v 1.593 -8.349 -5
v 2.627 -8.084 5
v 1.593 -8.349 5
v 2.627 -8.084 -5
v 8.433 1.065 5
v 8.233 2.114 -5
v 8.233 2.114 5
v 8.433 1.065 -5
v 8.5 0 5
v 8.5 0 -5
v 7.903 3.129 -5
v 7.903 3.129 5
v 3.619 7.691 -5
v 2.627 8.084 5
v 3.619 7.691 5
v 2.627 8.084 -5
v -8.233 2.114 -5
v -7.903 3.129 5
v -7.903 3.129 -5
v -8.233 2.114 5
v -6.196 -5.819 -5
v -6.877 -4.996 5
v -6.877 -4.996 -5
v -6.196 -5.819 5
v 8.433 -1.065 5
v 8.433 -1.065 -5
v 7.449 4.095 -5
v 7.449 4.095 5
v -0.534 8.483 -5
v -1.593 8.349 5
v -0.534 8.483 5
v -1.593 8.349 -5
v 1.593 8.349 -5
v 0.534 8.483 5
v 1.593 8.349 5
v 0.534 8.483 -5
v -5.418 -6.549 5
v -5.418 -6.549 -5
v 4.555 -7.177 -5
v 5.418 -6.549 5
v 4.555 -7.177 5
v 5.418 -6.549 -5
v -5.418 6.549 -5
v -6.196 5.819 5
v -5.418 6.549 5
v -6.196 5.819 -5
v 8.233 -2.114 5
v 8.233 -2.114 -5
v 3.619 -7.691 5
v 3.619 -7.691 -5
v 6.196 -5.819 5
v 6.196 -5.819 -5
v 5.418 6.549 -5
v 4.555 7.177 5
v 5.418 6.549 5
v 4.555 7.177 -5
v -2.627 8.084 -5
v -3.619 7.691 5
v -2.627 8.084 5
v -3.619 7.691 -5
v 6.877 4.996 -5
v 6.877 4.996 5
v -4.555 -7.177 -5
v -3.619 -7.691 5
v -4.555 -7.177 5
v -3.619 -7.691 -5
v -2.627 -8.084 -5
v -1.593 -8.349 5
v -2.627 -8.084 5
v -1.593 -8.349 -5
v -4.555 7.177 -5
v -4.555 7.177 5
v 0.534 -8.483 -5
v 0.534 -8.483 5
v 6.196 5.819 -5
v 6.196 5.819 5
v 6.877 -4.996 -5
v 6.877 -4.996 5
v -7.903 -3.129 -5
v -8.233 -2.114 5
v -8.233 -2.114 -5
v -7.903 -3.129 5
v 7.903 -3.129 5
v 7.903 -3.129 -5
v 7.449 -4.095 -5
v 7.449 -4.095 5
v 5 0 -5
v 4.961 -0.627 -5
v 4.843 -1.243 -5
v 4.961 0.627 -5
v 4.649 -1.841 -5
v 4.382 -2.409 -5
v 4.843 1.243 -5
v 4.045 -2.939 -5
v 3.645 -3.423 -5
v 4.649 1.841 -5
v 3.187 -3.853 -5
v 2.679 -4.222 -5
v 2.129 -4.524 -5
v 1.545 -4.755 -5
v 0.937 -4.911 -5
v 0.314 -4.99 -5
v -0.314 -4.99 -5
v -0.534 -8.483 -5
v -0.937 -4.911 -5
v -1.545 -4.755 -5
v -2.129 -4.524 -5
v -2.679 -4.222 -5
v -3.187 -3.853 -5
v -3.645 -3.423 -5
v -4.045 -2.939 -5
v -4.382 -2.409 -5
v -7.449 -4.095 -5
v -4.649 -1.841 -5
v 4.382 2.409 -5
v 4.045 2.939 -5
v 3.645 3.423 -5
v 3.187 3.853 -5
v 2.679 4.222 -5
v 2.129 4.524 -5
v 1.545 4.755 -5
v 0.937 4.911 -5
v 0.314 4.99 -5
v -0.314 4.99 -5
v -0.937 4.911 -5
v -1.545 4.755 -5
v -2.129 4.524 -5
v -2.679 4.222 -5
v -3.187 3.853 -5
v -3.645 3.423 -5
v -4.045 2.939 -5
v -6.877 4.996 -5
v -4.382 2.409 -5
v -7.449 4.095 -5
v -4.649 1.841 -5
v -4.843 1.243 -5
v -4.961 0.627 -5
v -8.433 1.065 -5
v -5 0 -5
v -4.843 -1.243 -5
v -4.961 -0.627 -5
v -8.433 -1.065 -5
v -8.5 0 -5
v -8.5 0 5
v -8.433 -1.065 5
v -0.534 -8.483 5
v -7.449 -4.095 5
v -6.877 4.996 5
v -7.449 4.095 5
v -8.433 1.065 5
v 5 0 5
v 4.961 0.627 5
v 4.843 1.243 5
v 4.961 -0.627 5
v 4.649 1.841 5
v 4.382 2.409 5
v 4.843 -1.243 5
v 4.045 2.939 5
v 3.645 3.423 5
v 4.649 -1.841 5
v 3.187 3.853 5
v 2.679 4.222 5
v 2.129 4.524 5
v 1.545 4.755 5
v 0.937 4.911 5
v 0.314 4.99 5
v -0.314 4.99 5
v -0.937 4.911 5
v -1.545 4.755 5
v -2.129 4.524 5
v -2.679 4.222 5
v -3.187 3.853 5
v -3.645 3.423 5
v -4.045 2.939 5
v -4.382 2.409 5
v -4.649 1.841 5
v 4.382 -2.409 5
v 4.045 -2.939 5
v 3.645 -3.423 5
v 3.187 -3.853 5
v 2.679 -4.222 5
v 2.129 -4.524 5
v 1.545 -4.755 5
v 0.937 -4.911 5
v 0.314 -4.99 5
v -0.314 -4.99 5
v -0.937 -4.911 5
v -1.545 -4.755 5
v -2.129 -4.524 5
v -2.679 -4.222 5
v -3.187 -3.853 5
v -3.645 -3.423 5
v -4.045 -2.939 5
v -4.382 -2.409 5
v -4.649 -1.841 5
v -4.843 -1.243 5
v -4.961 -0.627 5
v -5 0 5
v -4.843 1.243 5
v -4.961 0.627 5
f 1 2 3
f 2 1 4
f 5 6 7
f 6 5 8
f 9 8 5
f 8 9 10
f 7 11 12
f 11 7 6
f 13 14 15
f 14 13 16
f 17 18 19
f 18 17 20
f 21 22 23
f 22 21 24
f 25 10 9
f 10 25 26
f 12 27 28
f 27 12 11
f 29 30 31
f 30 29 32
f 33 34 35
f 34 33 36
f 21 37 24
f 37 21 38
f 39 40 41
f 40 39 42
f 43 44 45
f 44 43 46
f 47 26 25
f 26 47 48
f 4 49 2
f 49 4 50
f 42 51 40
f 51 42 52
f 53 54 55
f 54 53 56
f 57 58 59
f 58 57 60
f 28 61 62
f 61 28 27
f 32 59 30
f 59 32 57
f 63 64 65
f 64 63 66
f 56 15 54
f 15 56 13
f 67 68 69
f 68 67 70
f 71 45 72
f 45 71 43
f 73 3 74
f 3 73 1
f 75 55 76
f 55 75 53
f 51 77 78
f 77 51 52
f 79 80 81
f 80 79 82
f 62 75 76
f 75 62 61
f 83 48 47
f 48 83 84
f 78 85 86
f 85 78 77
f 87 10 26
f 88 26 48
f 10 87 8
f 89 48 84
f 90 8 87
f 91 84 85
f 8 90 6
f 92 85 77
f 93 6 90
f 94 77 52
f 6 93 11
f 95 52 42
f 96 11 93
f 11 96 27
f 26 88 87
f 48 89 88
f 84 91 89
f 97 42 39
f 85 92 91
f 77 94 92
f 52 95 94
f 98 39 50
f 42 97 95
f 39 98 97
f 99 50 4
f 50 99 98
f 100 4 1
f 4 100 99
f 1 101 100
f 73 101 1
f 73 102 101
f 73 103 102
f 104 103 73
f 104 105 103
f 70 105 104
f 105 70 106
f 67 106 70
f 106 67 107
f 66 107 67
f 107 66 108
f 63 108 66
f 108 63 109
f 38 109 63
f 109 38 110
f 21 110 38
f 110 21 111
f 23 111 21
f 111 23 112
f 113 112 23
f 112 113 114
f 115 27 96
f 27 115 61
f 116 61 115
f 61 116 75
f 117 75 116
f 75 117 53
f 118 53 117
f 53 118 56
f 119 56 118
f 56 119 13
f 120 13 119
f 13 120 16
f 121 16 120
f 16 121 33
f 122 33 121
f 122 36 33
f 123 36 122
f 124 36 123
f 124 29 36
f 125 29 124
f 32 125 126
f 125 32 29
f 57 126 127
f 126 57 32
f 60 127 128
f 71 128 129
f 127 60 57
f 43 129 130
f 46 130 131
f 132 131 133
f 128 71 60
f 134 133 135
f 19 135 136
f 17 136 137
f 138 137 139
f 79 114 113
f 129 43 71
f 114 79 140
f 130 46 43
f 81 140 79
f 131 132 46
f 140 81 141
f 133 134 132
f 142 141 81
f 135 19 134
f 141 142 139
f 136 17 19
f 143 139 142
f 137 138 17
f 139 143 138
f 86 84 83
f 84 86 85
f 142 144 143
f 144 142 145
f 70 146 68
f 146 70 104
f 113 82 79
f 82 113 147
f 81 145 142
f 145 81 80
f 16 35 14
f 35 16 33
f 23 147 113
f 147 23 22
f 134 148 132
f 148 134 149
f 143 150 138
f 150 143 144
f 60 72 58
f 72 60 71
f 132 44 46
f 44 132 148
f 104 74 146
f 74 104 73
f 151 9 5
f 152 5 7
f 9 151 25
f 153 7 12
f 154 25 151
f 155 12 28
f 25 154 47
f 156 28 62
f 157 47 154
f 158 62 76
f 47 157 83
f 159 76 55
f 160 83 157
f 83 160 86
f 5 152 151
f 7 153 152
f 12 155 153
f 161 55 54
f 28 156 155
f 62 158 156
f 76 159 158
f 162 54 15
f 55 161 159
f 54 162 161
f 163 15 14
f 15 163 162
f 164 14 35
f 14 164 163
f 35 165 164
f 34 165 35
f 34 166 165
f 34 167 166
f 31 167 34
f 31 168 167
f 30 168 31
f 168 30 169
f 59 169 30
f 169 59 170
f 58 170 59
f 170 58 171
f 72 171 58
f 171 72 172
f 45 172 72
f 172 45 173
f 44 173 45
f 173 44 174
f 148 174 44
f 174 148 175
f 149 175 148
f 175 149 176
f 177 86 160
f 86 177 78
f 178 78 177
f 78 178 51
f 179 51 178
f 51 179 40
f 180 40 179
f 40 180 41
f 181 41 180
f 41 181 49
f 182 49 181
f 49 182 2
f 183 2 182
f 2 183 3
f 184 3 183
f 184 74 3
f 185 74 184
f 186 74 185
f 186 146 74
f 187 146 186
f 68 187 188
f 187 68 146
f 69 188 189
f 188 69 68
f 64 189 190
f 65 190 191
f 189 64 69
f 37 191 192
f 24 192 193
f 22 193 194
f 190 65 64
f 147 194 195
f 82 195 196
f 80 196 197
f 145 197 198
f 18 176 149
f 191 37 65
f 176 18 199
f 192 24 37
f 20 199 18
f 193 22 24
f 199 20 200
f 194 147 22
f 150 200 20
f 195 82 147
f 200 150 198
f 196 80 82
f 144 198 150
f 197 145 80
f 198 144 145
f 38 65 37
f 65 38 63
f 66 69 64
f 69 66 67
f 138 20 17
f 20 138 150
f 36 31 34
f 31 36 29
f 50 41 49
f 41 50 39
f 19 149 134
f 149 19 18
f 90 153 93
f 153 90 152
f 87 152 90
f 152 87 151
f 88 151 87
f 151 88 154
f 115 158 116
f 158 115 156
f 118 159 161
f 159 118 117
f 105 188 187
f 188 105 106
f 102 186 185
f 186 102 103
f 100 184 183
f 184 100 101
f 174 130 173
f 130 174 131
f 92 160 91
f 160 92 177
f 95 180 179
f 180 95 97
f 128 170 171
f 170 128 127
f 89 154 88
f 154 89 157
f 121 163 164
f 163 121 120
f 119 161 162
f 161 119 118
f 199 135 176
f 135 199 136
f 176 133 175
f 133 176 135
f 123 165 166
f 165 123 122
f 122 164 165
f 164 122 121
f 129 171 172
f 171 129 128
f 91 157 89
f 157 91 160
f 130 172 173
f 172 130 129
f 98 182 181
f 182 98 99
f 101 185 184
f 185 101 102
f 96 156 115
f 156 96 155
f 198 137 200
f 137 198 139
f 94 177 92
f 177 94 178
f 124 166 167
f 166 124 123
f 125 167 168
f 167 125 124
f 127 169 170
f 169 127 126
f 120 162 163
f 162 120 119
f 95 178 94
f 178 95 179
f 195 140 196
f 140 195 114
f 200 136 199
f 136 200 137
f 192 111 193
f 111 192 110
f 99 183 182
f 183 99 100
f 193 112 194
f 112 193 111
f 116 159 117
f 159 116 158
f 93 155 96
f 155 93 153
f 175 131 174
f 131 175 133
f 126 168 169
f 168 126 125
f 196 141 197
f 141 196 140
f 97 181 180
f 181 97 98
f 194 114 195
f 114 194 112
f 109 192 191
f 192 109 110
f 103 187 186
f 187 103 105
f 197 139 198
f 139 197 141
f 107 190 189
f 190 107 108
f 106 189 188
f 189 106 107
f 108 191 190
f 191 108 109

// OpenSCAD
$fn = 50;


difference() {
	union() {
		translate(v = [0, 0, -5.0000000000]) {
			cylinder(h = 10, r = 8.5000000000);
		}
	}
	union() {
		translate(v = [0, 0, -100.0000000000]) {
			cylinder(h = 200, r = 5.0000000000);
		}
	}
}
